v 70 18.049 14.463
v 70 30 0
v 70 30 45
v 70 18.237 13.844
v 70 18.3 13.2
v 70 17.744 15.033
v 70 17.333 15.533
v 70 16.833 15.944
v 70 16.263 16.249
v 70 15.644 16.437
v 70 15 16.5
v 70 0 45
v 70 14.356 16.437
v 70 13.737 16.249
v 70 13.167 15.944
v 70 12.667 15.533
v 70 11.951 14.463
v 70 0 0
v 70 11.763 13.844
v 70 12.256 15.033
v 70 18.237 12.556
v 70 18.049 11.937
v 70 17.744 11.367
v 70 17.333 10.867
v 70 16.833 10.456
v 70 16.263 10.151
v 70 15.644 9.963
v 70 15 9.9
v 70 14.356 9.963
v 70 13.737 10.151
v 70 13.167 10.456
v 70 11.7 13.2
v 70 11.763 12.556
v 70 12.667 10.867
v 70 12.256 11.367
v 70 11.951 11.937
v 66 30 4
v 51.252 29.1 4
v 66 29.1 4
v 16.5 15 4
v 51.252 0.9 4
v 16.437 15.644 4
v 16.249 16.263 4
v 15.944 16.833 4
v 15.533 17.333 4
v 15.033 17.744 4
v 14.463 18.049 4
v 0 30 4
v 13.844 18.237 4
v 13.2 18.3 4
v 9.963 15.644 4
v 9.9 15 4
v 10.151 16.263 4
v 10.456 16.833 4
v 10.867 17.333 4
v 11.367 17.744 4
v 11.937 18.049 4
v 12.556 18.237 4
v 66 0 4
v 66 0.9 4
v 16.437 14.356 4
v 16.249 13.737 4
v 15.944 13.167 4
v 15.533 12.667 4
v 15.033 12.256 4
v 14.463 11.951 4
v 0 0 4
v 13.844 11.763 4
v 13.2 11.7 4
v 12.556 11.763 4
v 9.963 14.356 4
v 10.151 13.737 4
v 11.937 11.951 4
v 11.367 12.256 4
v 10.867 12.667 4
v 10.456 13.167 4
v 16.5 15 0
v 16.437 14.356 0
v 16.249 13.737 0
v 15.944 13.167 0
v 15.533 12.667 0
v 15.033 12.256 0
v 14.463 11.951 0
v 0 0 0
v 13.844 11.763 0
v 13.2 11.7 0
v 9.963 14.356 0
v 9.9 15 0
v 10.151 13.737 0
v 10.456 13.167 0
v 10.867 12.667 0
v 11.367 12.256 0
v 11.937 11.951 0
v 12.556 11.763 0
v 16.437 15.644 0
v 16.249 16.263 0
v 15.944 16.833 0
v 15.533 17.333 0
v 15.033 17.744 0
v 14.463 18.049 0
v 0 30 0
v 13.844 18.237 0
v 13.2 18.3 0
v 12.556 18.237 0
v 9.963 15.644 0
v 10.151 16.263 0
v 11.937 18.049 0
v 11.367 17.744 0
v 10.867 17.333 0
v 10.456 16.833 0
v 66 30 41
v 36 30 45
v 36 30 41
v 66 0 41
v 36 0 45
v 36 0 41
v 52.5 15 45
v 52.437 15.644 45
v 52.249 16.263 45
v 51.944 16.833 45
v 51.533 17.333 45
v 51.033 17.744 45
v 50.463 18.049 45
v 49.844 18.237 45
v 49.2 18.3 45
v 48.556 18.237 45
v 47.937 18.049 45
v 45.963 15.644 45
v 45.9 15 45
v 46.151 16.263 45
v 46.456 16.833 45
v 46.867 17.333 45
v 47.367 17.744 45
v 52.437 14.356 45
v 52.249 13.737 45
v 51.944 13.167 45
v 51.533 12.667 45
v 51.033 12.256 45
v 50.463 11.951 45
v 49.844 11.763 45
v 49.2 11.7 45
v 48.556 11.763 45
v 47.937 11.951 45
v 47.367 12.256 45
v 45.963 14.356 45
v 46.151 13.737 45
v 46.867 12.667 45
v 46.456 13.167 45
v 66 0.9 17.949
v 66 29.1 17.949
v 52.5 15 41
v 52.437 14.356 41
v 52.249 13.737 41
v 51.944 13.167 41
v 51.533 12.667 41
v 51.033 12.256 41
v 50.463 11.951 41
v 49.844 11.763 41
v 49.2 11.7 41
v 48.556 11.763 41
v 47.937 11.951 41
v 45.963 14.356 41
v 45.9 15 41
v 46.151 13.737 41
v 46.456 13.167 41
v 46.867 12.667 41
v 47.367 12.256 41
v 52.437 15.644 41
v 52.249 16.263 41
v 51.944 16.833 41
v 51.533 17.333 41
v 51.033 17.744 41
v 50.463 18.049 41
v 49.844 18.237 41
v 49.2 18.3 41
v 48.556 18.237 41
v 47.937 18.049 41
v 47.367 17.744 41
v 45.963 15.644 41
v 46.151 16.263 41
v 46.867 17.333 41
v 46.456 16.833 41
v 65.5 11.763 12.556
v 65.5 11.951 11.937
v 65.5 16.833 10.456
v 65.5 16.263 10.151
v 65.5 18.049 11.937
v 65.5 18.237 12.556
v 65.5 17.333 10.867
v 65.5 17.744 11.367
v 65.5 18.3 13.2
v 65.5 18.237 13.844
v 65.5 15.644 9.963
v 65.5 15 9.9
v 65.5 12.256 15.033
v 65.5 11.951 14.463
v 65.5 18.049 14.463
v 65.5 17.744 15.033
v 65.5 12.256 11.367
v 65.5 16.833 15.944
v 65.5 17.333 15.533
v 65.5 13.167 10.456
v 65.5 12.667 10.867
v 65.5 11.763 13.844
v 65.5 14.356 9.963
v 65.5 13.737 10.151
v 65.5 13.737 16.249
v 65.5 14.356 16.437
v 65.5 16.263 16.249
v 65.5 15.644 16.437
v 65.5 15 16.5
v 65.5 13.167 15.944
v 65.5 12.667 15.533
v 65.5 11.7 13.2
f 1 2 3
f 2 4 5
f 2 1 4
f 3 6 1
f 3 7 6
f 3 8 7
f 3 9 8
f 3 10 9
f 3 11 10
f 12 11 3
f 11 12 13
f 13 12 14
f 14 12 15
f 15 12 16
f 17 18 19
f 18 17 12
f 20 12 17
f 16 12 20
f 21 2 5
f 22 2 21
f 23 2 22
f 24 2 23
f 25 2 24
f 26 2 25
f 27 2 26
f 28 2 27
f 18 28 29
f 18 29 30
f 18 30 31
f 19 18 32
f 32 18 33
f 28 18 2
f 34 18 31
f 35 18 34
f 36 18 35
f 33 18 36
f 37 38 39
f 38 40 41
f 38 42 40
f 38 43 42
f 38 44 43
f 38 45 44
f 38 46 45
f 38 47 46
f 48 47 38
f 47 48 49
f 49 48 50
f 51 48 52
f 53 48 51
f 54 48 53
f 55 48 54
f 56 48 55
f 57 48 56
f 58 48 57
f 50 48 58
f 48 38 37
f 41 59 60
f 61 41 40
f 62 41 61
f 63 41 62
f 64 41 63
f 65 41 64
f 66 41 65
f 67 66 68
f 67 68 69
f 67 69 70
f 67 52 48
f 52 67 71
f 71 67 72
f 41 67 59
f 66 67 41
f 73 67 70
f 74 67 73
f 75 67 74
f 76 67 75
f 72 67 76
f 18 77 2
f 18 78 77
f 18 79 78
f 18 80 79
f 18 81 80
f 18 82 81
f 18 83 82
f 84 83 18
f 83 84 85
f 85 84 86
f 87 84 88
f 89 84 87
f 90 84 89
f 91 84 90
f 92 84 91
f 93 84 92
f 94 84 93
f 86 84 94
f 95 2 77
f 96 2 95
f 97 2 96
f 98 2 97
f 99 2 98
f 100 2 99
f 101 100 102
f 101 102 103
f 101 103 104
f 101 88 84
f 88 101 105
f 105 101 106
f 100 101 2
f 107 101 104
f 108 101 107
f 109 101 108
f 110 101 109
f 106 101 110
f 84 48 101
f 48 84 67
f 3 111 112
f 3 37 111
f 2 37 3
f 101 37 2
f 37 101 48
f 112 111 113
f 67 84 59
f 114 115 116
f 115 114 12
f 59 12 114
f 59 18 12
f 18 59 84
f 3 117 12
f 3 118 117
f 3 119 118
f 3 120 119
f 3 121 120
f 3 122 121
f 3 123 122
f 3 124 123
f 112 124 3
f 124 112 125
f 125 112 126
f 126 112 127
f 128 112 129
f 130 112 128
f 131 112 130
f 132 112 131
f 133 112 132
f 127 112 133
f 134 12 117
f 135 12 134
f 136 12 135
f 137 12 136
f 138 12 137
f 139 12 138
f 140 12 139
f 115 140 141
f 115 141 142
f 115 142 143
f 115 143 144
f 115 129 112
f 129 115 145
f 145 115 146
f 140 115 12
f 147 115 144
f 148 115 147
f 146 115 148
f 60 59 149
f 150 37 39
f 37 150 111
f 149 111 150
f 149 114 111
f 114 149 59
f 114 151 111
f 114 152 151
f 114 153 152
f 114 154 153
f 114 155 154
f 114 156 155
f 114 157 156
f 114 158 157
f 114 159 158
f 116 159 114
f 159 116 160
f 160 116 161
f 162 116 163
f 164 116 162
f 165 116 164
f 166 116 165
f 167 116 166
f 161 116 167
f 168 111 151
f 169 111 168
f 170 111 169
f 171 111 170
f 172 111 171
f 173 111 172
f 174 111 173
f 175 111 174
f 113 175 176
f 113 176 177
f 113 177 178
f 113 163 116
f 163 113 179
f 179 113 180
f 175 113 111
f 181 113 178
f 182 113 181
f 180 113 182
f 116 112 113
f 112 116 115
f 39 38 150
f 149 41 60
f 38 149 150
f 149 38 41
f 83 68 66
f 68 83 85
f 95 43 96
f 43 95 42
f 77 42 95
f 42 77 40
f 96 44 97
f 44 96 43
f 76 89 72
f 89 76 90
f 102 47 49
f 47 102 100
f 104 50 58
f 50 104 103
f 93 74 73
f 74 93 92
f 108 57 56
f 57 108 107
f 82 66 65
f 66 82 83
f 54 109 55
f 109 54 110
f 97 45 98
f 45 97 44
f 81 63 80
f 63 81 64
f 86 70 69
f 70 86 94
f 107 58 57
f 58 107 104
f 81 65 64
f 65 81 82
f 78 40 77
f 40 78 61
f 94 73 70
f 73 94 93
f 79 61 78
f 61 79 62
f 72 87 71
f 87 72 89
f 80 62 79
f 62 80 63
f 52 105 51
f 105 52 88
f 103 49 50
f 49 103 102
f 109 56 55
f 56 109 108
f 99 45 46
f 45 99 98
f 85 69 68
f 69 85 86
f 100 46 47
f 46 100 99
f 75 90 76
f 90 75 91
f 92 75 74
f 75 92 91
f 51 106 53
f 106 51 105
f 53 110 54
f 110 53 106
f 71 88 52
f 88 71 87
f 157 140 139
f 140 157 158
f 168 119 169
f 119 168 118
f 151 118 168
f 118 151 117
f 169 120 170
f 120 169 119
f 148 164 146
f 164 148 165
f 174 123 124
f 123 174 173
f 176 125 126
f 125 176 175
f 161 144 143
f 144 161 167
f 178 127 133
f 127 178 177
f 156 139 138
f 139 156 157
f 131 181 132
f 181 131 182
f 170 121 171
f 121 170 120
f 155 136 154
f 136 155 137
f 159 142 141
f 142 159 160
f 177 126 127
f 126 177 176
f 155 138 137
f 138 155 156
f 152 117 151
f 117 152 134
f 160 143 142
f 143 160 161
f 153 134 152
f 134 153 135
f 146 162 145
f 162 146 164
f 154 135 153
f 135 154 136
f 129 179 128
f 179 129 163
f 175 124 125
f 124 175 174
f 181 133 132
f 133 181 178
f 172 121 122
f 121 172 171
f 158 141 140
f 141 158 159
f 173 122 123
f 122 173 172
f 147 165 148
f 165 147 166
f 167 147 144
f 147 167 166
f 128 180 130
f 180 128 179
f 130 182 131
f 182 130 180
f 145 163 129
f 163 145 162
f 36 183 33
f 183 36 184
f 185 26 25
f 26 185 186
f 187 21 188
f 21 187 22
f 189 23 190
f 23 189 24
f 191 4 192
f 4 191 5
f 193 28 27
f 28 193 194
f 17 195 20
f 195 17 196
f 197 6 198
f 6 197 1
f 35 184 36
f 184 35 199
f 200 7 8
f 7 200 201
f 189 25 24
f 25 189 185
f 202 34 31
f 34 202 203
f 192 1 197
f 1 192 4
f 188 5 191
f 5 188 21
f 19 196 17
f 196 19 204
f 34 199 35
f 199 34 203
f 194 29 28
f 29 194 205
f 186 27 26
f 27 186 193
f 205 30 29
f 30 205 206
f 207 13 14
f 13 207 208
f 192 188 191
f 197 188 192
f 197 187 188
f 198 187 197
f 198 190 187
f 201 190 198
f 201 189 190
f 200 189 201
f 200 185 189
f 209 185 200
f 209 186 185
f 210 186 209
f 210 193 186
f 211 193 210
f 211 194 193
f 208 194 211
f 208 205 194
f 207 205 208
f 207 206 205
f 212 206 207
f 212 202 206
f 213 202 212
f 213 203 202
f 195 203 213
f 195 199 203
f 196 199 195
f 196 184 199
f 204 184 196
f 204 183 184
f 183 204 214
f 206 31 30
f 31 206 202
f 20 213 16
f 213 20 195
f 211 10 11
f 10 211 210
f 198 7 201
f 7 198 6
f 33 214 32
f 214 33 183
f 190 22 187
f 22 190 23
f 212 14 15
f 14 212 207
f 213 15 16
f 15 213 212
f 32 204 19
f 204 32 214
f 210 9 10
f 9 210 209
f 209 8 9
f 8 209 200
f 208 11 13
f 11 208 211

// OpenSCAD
$fn = 32;

// ----------------------------------------------------------------------
// Z-bracket: 70 x 30 x 45 mm
// ----------------------------------------------------------------------

// --- parameters (mm) ---
bottom_run = 70;          // lower foot length, X
top_run = 30;             // upper foot length, X
profile_w = 30;           // bracket width, Y
height = 45;              // overall rise, Z
mat_t = 4;                // plate thickness
hole_d = 6.6;             // clearance for M6
rib_len = 15.7;           // gusset leg
rib_sink = 0.9;           // gusset overlap into the plates

module hole_z(px, py, z0) {
  translate([px, py, z0 - 0.5]) cylinder(h = mat_t + 1, d = hole_d);
}
module hole_x(py, pz) {
  translate([-0.5, py, pz]) rotate([0, 90, 0]) cylinder(h = mat_t + 1, d = hole_d);
}
module gusset(x0) {
  translate([x0, profile_w - rib_sink, 0])
    rotate([90, 0, 0])
      linear_extrude(height = profile_w - 2 * rib_sink)
        polygon(points = [[rib_sink, mat_t - rib_sink],
                          [rib_sink, mat_t - rib_sink + rib_len],
                          [-rib_len, mat_t - rib_sink]]);
}

difference() {
  union() {
    cube([bottom_run, profile_w, mat_t]);
    /* web, overlapping the lower foot */
    translate([bottom_run - mat_t, 0, 0]) cube([mat_t, profile_w, height]);
    /* upper foot, sunk into the web */
    translate([bottom_run - mat_t - top_run, 0, height - mat_t]) cube([top_run + mat_t, profile_w, mat_t]);
    gusset(bottom_run - mat_t);
  }
  hole_z(13.2, 15, 0);
  translate([bottom_run - mat_t - 16.8, 0, 0]) hole_z(0, 15, height - mat_t);
  translate([bottom_run - mat_t, 0, 0]) hole_x(15, 13.2);
}
